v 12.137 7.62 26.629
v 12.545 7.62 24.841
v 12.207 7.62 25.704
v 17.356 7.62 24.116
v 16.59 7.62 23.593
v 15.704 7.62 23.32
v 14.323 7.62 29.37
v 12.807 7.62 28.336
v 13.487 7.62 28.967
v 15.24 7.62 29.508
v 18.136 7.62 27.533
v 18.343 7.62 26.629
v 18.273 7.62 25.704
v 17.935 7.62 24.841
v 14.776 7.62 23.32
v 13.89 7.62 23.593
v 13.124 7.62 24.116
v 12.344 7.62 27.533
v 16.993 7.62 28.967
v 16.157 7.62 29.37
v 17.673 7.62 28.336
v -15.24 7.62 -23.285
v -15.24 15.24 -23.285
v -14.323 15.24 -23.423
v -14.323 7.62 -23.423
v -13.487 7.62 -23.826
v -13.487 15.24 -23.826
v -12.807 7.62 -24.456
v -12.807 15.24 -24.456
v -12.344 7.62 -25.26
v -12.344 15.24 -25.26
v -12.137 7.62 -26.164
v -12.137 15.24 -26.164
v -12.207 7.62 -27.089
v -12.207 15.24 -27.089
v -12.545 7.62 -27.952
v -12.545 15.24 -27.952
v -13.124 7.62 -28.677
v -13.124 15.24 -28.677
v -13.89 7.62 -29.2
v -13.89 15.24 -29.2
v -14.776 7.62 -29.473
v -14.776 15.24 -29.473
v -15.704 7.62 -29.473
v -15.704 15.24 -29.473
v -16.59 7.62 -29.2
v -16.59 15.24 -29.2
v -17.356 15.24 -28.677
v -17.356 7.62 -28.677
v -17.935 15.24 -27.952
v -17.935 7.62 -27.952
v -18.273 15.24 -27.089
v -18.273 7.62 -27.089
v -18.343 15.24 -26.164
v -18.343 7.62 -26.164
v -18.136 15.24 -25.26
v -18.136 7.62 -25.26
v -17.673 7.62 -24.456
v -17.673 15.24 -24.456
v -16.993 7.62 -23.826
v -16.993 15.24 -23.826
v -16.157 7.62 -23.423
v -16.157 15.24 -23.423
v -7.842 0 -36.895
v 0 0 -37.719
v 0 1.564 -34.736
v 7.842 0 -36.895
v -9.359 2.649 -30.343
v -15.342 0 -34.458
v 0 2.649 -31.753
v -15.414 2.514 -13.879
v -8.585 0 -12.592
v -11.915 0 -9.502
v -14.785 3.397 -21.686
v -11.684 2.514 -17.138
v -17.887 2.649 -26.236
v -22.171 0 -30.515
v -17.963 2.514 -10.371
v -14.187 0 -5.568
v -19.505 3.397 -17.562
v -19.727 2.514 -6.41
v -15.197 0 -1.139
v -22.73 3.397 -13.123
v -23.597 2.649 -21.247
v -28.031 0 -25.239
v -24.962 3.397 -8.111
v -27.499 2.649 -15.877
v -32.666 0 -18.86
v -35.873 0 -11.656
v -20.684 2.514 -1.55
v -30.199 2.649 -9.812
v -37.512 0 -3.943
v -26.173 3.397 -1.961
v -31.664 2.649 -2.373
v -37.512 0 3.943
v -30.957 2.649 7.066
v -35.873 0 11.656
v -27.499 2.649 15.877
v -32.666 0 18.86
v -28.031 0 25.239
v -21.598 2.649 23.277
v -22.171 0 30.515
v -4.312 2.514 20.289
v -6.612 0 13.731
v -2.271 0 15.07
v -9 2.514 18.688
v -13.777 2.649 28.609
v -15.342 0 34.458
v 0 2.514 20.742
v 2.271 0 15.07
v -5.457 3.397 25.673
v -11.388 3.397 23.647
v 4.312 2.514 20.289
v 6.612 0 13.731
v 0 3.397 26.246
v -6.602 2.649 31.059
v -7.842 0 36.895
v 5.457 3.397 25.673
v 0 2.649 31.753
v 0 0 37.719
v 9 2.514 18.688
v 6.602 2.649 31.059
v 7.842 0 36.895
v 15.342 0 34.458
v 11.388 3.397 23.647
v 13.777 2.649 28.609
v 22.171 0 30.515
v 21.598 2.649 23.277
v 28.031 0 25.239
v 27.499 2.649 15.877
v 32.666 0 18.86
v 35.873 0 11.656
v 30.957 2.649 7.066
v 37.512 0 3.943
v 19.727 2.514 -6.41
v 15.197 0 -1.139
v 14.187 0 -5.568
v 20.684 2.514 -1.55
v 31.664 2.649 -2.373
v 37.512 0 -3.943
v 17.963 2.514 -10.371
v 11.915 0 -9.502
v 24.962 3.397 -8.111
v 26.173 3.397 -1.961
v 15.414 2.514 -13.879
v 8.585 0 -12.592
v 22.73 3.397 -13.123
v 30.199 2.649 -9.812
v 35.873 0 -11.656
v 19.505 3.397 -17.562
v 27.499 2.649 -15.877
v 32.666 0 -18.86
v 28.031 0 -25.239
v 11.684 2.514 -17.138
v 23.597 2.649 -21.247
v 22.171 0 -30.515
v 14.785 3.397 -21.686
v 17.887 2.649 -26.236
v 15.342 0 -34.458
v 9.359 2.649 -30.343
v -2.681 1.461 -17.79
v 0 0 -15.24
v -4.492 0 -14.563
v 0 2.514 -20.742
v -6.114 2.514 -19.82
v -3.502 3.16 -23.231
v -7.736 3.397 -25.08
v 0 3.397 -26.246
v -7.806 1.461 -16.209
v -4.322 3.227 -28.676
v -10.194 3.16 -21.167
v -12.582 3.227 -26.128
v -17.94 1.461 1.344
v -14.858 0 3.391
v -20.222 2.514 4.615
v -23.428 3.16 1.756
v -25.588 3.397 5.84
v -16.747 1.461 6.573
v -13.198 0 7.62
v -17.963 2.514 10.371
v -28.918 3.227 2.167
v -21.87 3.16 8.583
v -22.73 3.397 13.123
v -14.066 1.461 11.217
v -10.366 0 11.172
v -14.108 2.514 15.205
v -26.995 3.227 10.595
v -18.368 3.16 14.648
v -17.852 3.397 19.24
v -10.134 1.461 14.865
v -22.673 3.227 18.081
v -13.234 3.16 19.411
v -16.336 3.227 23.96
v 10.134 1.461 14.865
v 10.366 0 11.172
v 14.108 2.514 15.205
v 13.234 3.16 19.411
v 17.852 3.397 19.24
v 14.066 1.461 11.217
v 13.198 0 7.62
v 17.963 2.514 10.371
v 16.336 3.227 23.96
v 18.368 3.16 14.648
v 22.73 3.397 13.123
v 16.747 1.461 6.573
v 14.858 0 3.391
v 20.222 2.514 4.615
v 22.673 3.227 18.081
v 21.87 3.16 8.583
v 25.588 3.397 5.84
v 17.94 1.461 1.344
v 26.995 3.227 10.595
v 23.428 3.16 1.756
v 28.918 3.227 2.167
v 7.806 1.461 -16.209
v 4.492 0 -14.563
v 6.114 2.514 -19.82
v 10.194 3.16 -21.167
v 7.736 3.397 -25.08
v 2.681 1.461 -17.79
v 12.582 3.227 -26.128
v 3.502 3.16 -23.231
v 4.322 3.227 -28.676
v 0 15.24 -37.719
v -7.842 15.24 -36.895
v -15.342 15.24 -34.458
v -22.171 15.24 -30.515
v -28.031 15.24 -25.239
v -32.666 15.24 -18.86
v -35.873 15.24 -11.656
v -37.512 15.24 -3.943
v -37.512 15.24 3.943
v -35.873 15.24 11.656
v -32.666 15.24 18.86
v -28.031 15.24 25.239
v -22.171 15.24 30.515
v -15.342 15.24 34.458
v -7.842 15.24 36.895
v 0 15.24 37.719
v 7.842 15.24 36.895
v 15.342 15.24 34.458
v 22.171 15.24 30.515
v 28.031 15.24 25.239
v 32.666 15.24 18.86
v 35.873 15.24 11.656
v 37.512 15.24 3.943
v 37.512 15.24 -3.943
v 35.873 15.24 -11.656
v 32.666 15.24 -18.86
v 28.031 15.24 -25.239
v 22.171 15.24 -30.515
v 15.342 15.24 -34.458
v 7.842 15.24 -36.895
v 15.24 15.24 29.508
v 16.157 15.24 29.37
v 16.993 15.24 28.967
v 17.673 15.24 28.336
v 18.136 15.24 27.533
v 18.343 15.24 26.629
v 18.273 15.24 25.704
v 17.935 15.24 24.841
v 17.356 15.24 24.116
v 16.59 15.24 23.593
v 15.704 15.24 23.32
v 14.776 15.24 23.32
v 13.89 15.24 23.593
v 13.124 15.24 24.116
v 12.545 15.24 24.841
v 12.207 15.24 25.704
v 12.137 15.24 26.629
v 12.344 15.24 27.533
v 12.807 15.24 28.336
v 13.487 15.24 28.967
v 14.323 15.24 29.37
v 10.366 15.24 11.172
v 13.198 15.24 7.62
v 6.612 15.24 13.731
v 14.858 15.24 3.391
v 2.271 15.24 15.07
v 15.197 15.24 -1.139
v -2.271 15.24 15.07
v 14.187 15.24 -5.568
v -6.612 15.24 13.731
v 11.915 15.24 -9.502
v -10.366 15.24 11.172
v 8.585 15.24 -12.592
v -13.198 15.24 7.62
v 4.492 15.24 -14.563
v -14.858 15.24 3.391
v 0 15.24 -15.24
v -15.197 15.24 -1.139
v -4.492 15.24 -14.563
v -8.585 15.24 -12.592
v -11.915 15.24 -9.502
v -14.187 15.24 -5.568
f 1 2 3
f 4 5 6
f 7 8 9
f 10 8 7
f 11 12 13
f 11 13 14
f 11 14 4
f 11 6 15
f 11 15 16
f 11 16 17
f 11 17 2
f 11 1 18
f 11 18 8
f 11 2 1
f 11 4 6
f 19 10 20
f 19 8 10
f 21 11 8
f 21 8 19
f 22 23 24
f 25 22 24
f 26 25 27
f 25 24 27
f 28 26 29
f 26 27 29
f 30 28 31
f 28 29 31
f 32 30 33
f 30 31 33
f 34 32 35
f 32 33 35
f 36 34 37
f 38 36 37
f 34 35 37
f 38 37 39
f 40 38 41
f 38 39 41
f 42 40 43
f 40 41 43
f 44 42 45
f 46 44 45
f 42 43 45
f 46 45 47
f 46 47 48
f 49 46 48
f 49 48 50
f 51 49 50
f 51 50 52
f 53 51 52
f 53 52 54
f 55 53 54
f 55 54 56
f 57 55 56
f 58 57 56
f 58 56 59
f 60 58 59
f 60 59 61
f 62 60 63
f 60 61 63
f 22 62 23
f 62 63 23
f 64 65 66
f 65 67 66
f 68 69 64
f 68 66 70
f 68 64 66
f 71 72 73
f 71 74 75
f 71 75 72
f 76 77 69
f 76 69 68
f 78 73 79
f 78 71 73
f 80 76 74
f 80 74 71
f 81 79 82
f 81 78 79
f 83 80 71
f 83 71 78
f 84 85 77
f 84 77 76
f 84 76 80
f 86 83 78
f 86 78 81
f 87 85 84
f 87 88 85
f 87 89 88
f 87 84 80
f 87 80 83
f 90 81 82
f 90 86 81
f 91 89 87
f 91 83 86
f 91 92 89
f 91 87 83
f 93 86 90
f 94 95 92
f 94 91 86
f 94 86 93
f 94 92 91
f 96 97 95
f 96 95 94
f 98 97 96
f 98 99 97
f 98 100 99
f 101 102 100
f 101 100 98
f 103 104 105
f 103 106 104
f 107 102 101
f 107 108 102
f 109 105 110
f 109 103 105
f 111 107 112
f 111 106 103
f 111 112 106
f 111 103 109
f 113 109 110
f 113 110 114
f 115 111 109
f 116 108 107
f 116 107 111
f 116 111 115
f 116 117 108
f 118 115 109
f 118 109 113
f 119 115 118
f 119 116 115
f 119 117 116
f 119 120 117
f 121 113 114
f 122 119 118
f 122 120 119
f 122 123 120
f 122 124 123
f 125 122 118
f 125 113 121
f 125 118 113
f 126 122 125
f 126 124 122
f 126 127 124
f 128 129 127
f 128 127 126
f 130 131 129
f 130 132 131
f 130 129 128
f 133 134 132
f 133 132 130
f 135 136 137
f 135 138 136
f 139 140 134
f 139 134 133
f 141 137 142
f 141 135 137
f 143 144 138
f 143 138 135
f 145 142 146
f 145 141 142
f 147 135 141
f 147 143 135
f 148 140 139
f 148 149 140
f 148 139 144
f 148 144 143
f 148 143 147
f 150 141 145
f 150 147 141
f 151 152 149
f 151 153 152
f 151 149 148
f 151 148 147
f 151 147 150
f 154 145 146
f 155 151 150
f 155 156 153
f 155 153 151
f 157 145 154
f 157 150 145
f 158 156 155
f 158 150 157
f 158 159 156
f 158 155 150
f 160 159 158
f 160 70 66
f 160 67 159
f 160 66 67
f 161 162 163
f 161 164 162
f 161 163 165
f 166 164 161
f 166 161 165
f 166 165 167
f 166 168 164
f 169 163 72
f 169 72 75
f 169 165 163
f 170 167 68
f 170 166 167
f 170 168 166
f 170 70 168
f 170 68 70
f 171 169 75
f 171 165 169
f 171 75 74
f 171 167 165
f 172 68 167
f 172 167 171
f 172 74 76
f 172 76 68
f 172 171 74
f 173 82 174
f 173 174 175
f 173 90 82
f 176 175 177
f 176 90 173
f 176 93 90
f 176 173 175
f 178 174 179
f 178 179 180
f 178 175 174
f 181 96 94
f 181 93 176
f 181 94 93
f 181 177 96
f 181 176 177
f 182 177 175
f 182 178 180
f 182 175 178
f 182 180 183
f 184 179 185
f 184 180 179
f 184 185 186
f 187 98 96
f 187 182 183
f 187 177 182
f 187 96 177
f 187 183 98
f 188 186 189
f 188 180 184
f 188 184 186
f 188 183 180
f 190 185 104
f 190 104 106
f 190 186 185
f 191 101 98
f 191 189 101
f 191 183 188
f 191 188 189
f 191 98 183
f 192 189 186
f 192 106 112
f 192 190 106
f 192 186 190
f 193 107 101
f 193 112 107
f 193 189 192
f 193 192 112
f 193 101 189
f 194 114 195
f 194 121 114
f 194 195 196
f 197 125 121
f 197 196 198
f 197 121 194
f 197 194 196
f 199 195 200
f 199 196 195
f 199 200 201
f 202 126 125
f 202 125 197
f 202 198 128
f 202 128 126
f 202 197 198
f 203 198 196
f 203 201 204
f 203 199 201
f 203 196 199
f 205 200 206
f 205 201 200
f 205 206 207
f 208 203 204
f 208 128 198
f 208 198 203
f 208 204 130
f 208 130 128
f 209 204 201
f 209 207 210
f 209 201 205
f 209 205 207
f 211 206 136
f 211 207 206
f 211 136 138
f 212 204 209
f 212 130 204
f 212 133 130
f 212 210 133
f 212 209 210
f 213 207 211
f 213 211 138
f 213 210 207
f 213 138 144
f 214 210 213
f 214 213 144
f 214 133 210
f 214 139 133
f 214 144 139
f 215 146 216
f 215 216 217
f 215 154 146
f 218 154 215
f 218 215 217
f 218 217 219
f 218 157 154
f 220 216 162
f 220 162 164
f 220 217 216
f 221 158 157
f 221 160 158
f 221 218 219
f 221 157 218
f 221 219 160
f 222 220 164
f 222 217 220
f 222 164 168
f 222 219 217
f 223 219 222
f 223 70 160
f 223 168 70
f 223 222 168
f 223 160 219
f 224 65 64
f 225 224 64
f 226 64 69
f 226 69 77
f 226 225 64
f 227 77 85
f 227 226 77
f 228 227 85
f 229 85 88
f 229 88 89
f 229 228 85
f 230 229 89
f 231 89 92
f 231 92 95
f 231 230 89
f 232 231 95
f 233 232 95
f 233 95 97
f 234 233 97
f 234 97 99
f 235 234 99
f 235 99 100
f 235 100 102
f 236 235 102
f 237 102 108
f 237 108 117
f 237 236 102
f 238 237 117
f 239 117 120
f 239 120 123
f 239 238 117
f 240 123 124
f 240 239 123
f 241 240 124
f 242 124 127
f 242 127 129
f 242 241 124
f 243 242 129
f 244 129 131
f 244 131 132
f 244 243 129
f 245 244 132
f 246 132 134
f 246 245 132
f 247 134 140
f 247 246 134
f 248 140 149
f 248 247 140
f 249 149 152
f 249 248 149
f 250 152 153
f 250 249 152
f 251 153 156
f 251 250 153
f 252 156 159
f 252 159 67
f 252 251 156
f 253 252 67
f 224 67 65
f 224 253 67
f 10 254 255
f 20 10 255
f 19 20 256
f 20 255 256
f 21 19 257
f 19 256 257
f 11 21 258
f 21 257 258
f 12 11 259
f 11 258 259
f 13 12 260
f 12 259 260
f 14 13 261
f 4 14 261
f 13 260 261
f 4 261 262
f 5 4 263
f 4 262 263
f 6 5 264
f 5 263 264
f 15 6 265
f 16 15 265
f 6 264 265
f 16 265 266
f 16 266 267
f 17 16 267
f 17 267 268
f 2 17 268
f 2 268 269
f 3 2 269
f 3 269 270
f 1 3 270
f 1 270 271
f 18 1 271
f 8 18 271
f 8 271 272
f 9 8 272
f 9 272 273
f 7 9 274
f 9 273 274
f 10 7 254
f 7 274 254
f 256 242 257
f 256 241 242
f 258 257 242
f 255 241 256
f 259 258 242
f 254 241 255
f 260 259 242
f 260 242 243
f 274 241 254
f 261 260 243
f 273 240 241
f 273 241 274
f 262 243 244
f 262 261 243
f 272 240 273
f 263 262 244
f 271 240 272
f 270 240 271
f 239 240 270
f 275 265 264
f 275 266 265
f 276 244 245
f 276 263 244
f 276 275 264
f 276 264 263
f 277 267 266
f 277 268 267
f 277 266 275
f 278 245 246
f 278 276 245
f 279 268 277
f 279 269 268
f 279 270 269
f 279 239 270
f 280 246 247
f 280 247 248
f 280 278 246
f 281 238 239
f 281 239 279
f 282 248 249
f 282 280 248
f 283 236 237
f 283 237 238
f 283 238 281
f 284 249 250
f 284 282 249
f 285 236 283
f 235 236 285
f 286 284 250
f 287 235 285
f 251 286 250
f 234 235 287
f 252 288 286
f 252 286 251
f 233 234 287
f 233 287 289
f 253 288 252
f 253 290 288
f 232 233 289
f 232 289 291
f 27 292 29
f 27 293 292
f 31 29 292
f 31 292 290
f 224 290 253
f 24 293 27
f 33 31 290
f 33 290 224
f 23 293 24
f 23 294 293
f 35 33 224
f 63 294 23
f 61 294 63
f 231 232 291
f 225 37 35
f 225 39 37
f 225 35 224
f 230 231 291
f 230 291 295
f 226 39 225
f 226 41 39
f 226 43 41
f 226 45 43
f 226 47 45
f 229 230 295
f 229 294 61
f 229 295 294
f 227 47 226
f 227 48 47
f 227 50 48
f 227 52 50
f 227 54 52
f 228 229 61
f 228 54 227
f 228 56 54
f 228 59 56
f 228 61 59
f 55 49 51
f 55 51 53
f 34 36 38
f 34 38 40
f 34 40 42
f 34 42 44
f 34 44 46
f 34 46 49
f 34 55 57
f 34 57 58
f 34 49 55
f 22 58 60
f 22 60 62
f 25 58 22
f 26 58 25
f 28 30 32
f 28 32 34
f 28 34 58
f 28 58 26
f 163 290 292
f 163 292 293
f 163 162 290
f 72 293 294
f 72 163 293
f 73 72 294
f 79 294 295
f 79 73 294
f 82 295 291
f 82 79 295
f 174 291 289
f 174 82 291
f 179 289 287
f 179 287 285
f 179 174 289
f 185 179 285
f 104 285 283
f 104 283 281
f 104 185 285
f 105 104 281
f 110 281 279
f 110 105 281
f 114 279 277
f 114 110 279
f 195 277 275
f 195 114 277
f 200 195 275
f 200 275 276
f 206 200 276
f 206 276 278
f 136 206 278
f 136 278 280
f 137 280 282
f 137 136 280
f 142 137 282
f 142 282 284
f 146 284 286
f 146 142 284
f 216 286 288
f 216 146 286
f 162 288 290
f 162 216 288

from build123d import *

# Parameters (mm, degrees)
SKETCH2_R          = 3.1115
CUT_EXTRUDE1_DEPTH = 7.62


with BuildPart() as part:
    # Sketch1 → Revolve1 (revolve)
    with BuildSketch(Plane.XY, mode=Mode.PRIVATE) as revolve1_sk:
        with BuildLine():
            Line((37.719, 0), (37.719, 15.24))
            Line((37.719, 15.24), (15.24, 15.24))
            Line((15.24, 15.24), (15.24, 0))
            add(Edge.make_bspline(
                [(15.24, 0), (26.468860477, 6.797265709), (37.719, 0)],
                knots=[0, 0, 0, 1, 1, 1], degree=2))
        make_face()
    revolve(revolve1_sk.sketch.rotate(Axis((0, 0, 0), (0, 1, 0)), 90), axis=Axis((0, 0, 0), (0, 1, 0)))

    # Sketch2 → Cut-Extrude1 (cut)
    with BuildSketch(Plane(origin=(0, 15.24, 0), x_dir=(1, 0, 0), z_dir=(0, 1, 0))):
        with Locations(Location((15.24, -26.396454307, 0), (0, 0, 270))):
            Circle(SKETCH2_R)
        with Locations(Location((-15.24, 26.396454307, 0), (0, 0, 270))):
            Circle(SKETCH2_R)
    extrude(amount=-CUT_EXTRUDE1_DEPTH, mode=Mode.SUBTRACT)


solid = part.part
